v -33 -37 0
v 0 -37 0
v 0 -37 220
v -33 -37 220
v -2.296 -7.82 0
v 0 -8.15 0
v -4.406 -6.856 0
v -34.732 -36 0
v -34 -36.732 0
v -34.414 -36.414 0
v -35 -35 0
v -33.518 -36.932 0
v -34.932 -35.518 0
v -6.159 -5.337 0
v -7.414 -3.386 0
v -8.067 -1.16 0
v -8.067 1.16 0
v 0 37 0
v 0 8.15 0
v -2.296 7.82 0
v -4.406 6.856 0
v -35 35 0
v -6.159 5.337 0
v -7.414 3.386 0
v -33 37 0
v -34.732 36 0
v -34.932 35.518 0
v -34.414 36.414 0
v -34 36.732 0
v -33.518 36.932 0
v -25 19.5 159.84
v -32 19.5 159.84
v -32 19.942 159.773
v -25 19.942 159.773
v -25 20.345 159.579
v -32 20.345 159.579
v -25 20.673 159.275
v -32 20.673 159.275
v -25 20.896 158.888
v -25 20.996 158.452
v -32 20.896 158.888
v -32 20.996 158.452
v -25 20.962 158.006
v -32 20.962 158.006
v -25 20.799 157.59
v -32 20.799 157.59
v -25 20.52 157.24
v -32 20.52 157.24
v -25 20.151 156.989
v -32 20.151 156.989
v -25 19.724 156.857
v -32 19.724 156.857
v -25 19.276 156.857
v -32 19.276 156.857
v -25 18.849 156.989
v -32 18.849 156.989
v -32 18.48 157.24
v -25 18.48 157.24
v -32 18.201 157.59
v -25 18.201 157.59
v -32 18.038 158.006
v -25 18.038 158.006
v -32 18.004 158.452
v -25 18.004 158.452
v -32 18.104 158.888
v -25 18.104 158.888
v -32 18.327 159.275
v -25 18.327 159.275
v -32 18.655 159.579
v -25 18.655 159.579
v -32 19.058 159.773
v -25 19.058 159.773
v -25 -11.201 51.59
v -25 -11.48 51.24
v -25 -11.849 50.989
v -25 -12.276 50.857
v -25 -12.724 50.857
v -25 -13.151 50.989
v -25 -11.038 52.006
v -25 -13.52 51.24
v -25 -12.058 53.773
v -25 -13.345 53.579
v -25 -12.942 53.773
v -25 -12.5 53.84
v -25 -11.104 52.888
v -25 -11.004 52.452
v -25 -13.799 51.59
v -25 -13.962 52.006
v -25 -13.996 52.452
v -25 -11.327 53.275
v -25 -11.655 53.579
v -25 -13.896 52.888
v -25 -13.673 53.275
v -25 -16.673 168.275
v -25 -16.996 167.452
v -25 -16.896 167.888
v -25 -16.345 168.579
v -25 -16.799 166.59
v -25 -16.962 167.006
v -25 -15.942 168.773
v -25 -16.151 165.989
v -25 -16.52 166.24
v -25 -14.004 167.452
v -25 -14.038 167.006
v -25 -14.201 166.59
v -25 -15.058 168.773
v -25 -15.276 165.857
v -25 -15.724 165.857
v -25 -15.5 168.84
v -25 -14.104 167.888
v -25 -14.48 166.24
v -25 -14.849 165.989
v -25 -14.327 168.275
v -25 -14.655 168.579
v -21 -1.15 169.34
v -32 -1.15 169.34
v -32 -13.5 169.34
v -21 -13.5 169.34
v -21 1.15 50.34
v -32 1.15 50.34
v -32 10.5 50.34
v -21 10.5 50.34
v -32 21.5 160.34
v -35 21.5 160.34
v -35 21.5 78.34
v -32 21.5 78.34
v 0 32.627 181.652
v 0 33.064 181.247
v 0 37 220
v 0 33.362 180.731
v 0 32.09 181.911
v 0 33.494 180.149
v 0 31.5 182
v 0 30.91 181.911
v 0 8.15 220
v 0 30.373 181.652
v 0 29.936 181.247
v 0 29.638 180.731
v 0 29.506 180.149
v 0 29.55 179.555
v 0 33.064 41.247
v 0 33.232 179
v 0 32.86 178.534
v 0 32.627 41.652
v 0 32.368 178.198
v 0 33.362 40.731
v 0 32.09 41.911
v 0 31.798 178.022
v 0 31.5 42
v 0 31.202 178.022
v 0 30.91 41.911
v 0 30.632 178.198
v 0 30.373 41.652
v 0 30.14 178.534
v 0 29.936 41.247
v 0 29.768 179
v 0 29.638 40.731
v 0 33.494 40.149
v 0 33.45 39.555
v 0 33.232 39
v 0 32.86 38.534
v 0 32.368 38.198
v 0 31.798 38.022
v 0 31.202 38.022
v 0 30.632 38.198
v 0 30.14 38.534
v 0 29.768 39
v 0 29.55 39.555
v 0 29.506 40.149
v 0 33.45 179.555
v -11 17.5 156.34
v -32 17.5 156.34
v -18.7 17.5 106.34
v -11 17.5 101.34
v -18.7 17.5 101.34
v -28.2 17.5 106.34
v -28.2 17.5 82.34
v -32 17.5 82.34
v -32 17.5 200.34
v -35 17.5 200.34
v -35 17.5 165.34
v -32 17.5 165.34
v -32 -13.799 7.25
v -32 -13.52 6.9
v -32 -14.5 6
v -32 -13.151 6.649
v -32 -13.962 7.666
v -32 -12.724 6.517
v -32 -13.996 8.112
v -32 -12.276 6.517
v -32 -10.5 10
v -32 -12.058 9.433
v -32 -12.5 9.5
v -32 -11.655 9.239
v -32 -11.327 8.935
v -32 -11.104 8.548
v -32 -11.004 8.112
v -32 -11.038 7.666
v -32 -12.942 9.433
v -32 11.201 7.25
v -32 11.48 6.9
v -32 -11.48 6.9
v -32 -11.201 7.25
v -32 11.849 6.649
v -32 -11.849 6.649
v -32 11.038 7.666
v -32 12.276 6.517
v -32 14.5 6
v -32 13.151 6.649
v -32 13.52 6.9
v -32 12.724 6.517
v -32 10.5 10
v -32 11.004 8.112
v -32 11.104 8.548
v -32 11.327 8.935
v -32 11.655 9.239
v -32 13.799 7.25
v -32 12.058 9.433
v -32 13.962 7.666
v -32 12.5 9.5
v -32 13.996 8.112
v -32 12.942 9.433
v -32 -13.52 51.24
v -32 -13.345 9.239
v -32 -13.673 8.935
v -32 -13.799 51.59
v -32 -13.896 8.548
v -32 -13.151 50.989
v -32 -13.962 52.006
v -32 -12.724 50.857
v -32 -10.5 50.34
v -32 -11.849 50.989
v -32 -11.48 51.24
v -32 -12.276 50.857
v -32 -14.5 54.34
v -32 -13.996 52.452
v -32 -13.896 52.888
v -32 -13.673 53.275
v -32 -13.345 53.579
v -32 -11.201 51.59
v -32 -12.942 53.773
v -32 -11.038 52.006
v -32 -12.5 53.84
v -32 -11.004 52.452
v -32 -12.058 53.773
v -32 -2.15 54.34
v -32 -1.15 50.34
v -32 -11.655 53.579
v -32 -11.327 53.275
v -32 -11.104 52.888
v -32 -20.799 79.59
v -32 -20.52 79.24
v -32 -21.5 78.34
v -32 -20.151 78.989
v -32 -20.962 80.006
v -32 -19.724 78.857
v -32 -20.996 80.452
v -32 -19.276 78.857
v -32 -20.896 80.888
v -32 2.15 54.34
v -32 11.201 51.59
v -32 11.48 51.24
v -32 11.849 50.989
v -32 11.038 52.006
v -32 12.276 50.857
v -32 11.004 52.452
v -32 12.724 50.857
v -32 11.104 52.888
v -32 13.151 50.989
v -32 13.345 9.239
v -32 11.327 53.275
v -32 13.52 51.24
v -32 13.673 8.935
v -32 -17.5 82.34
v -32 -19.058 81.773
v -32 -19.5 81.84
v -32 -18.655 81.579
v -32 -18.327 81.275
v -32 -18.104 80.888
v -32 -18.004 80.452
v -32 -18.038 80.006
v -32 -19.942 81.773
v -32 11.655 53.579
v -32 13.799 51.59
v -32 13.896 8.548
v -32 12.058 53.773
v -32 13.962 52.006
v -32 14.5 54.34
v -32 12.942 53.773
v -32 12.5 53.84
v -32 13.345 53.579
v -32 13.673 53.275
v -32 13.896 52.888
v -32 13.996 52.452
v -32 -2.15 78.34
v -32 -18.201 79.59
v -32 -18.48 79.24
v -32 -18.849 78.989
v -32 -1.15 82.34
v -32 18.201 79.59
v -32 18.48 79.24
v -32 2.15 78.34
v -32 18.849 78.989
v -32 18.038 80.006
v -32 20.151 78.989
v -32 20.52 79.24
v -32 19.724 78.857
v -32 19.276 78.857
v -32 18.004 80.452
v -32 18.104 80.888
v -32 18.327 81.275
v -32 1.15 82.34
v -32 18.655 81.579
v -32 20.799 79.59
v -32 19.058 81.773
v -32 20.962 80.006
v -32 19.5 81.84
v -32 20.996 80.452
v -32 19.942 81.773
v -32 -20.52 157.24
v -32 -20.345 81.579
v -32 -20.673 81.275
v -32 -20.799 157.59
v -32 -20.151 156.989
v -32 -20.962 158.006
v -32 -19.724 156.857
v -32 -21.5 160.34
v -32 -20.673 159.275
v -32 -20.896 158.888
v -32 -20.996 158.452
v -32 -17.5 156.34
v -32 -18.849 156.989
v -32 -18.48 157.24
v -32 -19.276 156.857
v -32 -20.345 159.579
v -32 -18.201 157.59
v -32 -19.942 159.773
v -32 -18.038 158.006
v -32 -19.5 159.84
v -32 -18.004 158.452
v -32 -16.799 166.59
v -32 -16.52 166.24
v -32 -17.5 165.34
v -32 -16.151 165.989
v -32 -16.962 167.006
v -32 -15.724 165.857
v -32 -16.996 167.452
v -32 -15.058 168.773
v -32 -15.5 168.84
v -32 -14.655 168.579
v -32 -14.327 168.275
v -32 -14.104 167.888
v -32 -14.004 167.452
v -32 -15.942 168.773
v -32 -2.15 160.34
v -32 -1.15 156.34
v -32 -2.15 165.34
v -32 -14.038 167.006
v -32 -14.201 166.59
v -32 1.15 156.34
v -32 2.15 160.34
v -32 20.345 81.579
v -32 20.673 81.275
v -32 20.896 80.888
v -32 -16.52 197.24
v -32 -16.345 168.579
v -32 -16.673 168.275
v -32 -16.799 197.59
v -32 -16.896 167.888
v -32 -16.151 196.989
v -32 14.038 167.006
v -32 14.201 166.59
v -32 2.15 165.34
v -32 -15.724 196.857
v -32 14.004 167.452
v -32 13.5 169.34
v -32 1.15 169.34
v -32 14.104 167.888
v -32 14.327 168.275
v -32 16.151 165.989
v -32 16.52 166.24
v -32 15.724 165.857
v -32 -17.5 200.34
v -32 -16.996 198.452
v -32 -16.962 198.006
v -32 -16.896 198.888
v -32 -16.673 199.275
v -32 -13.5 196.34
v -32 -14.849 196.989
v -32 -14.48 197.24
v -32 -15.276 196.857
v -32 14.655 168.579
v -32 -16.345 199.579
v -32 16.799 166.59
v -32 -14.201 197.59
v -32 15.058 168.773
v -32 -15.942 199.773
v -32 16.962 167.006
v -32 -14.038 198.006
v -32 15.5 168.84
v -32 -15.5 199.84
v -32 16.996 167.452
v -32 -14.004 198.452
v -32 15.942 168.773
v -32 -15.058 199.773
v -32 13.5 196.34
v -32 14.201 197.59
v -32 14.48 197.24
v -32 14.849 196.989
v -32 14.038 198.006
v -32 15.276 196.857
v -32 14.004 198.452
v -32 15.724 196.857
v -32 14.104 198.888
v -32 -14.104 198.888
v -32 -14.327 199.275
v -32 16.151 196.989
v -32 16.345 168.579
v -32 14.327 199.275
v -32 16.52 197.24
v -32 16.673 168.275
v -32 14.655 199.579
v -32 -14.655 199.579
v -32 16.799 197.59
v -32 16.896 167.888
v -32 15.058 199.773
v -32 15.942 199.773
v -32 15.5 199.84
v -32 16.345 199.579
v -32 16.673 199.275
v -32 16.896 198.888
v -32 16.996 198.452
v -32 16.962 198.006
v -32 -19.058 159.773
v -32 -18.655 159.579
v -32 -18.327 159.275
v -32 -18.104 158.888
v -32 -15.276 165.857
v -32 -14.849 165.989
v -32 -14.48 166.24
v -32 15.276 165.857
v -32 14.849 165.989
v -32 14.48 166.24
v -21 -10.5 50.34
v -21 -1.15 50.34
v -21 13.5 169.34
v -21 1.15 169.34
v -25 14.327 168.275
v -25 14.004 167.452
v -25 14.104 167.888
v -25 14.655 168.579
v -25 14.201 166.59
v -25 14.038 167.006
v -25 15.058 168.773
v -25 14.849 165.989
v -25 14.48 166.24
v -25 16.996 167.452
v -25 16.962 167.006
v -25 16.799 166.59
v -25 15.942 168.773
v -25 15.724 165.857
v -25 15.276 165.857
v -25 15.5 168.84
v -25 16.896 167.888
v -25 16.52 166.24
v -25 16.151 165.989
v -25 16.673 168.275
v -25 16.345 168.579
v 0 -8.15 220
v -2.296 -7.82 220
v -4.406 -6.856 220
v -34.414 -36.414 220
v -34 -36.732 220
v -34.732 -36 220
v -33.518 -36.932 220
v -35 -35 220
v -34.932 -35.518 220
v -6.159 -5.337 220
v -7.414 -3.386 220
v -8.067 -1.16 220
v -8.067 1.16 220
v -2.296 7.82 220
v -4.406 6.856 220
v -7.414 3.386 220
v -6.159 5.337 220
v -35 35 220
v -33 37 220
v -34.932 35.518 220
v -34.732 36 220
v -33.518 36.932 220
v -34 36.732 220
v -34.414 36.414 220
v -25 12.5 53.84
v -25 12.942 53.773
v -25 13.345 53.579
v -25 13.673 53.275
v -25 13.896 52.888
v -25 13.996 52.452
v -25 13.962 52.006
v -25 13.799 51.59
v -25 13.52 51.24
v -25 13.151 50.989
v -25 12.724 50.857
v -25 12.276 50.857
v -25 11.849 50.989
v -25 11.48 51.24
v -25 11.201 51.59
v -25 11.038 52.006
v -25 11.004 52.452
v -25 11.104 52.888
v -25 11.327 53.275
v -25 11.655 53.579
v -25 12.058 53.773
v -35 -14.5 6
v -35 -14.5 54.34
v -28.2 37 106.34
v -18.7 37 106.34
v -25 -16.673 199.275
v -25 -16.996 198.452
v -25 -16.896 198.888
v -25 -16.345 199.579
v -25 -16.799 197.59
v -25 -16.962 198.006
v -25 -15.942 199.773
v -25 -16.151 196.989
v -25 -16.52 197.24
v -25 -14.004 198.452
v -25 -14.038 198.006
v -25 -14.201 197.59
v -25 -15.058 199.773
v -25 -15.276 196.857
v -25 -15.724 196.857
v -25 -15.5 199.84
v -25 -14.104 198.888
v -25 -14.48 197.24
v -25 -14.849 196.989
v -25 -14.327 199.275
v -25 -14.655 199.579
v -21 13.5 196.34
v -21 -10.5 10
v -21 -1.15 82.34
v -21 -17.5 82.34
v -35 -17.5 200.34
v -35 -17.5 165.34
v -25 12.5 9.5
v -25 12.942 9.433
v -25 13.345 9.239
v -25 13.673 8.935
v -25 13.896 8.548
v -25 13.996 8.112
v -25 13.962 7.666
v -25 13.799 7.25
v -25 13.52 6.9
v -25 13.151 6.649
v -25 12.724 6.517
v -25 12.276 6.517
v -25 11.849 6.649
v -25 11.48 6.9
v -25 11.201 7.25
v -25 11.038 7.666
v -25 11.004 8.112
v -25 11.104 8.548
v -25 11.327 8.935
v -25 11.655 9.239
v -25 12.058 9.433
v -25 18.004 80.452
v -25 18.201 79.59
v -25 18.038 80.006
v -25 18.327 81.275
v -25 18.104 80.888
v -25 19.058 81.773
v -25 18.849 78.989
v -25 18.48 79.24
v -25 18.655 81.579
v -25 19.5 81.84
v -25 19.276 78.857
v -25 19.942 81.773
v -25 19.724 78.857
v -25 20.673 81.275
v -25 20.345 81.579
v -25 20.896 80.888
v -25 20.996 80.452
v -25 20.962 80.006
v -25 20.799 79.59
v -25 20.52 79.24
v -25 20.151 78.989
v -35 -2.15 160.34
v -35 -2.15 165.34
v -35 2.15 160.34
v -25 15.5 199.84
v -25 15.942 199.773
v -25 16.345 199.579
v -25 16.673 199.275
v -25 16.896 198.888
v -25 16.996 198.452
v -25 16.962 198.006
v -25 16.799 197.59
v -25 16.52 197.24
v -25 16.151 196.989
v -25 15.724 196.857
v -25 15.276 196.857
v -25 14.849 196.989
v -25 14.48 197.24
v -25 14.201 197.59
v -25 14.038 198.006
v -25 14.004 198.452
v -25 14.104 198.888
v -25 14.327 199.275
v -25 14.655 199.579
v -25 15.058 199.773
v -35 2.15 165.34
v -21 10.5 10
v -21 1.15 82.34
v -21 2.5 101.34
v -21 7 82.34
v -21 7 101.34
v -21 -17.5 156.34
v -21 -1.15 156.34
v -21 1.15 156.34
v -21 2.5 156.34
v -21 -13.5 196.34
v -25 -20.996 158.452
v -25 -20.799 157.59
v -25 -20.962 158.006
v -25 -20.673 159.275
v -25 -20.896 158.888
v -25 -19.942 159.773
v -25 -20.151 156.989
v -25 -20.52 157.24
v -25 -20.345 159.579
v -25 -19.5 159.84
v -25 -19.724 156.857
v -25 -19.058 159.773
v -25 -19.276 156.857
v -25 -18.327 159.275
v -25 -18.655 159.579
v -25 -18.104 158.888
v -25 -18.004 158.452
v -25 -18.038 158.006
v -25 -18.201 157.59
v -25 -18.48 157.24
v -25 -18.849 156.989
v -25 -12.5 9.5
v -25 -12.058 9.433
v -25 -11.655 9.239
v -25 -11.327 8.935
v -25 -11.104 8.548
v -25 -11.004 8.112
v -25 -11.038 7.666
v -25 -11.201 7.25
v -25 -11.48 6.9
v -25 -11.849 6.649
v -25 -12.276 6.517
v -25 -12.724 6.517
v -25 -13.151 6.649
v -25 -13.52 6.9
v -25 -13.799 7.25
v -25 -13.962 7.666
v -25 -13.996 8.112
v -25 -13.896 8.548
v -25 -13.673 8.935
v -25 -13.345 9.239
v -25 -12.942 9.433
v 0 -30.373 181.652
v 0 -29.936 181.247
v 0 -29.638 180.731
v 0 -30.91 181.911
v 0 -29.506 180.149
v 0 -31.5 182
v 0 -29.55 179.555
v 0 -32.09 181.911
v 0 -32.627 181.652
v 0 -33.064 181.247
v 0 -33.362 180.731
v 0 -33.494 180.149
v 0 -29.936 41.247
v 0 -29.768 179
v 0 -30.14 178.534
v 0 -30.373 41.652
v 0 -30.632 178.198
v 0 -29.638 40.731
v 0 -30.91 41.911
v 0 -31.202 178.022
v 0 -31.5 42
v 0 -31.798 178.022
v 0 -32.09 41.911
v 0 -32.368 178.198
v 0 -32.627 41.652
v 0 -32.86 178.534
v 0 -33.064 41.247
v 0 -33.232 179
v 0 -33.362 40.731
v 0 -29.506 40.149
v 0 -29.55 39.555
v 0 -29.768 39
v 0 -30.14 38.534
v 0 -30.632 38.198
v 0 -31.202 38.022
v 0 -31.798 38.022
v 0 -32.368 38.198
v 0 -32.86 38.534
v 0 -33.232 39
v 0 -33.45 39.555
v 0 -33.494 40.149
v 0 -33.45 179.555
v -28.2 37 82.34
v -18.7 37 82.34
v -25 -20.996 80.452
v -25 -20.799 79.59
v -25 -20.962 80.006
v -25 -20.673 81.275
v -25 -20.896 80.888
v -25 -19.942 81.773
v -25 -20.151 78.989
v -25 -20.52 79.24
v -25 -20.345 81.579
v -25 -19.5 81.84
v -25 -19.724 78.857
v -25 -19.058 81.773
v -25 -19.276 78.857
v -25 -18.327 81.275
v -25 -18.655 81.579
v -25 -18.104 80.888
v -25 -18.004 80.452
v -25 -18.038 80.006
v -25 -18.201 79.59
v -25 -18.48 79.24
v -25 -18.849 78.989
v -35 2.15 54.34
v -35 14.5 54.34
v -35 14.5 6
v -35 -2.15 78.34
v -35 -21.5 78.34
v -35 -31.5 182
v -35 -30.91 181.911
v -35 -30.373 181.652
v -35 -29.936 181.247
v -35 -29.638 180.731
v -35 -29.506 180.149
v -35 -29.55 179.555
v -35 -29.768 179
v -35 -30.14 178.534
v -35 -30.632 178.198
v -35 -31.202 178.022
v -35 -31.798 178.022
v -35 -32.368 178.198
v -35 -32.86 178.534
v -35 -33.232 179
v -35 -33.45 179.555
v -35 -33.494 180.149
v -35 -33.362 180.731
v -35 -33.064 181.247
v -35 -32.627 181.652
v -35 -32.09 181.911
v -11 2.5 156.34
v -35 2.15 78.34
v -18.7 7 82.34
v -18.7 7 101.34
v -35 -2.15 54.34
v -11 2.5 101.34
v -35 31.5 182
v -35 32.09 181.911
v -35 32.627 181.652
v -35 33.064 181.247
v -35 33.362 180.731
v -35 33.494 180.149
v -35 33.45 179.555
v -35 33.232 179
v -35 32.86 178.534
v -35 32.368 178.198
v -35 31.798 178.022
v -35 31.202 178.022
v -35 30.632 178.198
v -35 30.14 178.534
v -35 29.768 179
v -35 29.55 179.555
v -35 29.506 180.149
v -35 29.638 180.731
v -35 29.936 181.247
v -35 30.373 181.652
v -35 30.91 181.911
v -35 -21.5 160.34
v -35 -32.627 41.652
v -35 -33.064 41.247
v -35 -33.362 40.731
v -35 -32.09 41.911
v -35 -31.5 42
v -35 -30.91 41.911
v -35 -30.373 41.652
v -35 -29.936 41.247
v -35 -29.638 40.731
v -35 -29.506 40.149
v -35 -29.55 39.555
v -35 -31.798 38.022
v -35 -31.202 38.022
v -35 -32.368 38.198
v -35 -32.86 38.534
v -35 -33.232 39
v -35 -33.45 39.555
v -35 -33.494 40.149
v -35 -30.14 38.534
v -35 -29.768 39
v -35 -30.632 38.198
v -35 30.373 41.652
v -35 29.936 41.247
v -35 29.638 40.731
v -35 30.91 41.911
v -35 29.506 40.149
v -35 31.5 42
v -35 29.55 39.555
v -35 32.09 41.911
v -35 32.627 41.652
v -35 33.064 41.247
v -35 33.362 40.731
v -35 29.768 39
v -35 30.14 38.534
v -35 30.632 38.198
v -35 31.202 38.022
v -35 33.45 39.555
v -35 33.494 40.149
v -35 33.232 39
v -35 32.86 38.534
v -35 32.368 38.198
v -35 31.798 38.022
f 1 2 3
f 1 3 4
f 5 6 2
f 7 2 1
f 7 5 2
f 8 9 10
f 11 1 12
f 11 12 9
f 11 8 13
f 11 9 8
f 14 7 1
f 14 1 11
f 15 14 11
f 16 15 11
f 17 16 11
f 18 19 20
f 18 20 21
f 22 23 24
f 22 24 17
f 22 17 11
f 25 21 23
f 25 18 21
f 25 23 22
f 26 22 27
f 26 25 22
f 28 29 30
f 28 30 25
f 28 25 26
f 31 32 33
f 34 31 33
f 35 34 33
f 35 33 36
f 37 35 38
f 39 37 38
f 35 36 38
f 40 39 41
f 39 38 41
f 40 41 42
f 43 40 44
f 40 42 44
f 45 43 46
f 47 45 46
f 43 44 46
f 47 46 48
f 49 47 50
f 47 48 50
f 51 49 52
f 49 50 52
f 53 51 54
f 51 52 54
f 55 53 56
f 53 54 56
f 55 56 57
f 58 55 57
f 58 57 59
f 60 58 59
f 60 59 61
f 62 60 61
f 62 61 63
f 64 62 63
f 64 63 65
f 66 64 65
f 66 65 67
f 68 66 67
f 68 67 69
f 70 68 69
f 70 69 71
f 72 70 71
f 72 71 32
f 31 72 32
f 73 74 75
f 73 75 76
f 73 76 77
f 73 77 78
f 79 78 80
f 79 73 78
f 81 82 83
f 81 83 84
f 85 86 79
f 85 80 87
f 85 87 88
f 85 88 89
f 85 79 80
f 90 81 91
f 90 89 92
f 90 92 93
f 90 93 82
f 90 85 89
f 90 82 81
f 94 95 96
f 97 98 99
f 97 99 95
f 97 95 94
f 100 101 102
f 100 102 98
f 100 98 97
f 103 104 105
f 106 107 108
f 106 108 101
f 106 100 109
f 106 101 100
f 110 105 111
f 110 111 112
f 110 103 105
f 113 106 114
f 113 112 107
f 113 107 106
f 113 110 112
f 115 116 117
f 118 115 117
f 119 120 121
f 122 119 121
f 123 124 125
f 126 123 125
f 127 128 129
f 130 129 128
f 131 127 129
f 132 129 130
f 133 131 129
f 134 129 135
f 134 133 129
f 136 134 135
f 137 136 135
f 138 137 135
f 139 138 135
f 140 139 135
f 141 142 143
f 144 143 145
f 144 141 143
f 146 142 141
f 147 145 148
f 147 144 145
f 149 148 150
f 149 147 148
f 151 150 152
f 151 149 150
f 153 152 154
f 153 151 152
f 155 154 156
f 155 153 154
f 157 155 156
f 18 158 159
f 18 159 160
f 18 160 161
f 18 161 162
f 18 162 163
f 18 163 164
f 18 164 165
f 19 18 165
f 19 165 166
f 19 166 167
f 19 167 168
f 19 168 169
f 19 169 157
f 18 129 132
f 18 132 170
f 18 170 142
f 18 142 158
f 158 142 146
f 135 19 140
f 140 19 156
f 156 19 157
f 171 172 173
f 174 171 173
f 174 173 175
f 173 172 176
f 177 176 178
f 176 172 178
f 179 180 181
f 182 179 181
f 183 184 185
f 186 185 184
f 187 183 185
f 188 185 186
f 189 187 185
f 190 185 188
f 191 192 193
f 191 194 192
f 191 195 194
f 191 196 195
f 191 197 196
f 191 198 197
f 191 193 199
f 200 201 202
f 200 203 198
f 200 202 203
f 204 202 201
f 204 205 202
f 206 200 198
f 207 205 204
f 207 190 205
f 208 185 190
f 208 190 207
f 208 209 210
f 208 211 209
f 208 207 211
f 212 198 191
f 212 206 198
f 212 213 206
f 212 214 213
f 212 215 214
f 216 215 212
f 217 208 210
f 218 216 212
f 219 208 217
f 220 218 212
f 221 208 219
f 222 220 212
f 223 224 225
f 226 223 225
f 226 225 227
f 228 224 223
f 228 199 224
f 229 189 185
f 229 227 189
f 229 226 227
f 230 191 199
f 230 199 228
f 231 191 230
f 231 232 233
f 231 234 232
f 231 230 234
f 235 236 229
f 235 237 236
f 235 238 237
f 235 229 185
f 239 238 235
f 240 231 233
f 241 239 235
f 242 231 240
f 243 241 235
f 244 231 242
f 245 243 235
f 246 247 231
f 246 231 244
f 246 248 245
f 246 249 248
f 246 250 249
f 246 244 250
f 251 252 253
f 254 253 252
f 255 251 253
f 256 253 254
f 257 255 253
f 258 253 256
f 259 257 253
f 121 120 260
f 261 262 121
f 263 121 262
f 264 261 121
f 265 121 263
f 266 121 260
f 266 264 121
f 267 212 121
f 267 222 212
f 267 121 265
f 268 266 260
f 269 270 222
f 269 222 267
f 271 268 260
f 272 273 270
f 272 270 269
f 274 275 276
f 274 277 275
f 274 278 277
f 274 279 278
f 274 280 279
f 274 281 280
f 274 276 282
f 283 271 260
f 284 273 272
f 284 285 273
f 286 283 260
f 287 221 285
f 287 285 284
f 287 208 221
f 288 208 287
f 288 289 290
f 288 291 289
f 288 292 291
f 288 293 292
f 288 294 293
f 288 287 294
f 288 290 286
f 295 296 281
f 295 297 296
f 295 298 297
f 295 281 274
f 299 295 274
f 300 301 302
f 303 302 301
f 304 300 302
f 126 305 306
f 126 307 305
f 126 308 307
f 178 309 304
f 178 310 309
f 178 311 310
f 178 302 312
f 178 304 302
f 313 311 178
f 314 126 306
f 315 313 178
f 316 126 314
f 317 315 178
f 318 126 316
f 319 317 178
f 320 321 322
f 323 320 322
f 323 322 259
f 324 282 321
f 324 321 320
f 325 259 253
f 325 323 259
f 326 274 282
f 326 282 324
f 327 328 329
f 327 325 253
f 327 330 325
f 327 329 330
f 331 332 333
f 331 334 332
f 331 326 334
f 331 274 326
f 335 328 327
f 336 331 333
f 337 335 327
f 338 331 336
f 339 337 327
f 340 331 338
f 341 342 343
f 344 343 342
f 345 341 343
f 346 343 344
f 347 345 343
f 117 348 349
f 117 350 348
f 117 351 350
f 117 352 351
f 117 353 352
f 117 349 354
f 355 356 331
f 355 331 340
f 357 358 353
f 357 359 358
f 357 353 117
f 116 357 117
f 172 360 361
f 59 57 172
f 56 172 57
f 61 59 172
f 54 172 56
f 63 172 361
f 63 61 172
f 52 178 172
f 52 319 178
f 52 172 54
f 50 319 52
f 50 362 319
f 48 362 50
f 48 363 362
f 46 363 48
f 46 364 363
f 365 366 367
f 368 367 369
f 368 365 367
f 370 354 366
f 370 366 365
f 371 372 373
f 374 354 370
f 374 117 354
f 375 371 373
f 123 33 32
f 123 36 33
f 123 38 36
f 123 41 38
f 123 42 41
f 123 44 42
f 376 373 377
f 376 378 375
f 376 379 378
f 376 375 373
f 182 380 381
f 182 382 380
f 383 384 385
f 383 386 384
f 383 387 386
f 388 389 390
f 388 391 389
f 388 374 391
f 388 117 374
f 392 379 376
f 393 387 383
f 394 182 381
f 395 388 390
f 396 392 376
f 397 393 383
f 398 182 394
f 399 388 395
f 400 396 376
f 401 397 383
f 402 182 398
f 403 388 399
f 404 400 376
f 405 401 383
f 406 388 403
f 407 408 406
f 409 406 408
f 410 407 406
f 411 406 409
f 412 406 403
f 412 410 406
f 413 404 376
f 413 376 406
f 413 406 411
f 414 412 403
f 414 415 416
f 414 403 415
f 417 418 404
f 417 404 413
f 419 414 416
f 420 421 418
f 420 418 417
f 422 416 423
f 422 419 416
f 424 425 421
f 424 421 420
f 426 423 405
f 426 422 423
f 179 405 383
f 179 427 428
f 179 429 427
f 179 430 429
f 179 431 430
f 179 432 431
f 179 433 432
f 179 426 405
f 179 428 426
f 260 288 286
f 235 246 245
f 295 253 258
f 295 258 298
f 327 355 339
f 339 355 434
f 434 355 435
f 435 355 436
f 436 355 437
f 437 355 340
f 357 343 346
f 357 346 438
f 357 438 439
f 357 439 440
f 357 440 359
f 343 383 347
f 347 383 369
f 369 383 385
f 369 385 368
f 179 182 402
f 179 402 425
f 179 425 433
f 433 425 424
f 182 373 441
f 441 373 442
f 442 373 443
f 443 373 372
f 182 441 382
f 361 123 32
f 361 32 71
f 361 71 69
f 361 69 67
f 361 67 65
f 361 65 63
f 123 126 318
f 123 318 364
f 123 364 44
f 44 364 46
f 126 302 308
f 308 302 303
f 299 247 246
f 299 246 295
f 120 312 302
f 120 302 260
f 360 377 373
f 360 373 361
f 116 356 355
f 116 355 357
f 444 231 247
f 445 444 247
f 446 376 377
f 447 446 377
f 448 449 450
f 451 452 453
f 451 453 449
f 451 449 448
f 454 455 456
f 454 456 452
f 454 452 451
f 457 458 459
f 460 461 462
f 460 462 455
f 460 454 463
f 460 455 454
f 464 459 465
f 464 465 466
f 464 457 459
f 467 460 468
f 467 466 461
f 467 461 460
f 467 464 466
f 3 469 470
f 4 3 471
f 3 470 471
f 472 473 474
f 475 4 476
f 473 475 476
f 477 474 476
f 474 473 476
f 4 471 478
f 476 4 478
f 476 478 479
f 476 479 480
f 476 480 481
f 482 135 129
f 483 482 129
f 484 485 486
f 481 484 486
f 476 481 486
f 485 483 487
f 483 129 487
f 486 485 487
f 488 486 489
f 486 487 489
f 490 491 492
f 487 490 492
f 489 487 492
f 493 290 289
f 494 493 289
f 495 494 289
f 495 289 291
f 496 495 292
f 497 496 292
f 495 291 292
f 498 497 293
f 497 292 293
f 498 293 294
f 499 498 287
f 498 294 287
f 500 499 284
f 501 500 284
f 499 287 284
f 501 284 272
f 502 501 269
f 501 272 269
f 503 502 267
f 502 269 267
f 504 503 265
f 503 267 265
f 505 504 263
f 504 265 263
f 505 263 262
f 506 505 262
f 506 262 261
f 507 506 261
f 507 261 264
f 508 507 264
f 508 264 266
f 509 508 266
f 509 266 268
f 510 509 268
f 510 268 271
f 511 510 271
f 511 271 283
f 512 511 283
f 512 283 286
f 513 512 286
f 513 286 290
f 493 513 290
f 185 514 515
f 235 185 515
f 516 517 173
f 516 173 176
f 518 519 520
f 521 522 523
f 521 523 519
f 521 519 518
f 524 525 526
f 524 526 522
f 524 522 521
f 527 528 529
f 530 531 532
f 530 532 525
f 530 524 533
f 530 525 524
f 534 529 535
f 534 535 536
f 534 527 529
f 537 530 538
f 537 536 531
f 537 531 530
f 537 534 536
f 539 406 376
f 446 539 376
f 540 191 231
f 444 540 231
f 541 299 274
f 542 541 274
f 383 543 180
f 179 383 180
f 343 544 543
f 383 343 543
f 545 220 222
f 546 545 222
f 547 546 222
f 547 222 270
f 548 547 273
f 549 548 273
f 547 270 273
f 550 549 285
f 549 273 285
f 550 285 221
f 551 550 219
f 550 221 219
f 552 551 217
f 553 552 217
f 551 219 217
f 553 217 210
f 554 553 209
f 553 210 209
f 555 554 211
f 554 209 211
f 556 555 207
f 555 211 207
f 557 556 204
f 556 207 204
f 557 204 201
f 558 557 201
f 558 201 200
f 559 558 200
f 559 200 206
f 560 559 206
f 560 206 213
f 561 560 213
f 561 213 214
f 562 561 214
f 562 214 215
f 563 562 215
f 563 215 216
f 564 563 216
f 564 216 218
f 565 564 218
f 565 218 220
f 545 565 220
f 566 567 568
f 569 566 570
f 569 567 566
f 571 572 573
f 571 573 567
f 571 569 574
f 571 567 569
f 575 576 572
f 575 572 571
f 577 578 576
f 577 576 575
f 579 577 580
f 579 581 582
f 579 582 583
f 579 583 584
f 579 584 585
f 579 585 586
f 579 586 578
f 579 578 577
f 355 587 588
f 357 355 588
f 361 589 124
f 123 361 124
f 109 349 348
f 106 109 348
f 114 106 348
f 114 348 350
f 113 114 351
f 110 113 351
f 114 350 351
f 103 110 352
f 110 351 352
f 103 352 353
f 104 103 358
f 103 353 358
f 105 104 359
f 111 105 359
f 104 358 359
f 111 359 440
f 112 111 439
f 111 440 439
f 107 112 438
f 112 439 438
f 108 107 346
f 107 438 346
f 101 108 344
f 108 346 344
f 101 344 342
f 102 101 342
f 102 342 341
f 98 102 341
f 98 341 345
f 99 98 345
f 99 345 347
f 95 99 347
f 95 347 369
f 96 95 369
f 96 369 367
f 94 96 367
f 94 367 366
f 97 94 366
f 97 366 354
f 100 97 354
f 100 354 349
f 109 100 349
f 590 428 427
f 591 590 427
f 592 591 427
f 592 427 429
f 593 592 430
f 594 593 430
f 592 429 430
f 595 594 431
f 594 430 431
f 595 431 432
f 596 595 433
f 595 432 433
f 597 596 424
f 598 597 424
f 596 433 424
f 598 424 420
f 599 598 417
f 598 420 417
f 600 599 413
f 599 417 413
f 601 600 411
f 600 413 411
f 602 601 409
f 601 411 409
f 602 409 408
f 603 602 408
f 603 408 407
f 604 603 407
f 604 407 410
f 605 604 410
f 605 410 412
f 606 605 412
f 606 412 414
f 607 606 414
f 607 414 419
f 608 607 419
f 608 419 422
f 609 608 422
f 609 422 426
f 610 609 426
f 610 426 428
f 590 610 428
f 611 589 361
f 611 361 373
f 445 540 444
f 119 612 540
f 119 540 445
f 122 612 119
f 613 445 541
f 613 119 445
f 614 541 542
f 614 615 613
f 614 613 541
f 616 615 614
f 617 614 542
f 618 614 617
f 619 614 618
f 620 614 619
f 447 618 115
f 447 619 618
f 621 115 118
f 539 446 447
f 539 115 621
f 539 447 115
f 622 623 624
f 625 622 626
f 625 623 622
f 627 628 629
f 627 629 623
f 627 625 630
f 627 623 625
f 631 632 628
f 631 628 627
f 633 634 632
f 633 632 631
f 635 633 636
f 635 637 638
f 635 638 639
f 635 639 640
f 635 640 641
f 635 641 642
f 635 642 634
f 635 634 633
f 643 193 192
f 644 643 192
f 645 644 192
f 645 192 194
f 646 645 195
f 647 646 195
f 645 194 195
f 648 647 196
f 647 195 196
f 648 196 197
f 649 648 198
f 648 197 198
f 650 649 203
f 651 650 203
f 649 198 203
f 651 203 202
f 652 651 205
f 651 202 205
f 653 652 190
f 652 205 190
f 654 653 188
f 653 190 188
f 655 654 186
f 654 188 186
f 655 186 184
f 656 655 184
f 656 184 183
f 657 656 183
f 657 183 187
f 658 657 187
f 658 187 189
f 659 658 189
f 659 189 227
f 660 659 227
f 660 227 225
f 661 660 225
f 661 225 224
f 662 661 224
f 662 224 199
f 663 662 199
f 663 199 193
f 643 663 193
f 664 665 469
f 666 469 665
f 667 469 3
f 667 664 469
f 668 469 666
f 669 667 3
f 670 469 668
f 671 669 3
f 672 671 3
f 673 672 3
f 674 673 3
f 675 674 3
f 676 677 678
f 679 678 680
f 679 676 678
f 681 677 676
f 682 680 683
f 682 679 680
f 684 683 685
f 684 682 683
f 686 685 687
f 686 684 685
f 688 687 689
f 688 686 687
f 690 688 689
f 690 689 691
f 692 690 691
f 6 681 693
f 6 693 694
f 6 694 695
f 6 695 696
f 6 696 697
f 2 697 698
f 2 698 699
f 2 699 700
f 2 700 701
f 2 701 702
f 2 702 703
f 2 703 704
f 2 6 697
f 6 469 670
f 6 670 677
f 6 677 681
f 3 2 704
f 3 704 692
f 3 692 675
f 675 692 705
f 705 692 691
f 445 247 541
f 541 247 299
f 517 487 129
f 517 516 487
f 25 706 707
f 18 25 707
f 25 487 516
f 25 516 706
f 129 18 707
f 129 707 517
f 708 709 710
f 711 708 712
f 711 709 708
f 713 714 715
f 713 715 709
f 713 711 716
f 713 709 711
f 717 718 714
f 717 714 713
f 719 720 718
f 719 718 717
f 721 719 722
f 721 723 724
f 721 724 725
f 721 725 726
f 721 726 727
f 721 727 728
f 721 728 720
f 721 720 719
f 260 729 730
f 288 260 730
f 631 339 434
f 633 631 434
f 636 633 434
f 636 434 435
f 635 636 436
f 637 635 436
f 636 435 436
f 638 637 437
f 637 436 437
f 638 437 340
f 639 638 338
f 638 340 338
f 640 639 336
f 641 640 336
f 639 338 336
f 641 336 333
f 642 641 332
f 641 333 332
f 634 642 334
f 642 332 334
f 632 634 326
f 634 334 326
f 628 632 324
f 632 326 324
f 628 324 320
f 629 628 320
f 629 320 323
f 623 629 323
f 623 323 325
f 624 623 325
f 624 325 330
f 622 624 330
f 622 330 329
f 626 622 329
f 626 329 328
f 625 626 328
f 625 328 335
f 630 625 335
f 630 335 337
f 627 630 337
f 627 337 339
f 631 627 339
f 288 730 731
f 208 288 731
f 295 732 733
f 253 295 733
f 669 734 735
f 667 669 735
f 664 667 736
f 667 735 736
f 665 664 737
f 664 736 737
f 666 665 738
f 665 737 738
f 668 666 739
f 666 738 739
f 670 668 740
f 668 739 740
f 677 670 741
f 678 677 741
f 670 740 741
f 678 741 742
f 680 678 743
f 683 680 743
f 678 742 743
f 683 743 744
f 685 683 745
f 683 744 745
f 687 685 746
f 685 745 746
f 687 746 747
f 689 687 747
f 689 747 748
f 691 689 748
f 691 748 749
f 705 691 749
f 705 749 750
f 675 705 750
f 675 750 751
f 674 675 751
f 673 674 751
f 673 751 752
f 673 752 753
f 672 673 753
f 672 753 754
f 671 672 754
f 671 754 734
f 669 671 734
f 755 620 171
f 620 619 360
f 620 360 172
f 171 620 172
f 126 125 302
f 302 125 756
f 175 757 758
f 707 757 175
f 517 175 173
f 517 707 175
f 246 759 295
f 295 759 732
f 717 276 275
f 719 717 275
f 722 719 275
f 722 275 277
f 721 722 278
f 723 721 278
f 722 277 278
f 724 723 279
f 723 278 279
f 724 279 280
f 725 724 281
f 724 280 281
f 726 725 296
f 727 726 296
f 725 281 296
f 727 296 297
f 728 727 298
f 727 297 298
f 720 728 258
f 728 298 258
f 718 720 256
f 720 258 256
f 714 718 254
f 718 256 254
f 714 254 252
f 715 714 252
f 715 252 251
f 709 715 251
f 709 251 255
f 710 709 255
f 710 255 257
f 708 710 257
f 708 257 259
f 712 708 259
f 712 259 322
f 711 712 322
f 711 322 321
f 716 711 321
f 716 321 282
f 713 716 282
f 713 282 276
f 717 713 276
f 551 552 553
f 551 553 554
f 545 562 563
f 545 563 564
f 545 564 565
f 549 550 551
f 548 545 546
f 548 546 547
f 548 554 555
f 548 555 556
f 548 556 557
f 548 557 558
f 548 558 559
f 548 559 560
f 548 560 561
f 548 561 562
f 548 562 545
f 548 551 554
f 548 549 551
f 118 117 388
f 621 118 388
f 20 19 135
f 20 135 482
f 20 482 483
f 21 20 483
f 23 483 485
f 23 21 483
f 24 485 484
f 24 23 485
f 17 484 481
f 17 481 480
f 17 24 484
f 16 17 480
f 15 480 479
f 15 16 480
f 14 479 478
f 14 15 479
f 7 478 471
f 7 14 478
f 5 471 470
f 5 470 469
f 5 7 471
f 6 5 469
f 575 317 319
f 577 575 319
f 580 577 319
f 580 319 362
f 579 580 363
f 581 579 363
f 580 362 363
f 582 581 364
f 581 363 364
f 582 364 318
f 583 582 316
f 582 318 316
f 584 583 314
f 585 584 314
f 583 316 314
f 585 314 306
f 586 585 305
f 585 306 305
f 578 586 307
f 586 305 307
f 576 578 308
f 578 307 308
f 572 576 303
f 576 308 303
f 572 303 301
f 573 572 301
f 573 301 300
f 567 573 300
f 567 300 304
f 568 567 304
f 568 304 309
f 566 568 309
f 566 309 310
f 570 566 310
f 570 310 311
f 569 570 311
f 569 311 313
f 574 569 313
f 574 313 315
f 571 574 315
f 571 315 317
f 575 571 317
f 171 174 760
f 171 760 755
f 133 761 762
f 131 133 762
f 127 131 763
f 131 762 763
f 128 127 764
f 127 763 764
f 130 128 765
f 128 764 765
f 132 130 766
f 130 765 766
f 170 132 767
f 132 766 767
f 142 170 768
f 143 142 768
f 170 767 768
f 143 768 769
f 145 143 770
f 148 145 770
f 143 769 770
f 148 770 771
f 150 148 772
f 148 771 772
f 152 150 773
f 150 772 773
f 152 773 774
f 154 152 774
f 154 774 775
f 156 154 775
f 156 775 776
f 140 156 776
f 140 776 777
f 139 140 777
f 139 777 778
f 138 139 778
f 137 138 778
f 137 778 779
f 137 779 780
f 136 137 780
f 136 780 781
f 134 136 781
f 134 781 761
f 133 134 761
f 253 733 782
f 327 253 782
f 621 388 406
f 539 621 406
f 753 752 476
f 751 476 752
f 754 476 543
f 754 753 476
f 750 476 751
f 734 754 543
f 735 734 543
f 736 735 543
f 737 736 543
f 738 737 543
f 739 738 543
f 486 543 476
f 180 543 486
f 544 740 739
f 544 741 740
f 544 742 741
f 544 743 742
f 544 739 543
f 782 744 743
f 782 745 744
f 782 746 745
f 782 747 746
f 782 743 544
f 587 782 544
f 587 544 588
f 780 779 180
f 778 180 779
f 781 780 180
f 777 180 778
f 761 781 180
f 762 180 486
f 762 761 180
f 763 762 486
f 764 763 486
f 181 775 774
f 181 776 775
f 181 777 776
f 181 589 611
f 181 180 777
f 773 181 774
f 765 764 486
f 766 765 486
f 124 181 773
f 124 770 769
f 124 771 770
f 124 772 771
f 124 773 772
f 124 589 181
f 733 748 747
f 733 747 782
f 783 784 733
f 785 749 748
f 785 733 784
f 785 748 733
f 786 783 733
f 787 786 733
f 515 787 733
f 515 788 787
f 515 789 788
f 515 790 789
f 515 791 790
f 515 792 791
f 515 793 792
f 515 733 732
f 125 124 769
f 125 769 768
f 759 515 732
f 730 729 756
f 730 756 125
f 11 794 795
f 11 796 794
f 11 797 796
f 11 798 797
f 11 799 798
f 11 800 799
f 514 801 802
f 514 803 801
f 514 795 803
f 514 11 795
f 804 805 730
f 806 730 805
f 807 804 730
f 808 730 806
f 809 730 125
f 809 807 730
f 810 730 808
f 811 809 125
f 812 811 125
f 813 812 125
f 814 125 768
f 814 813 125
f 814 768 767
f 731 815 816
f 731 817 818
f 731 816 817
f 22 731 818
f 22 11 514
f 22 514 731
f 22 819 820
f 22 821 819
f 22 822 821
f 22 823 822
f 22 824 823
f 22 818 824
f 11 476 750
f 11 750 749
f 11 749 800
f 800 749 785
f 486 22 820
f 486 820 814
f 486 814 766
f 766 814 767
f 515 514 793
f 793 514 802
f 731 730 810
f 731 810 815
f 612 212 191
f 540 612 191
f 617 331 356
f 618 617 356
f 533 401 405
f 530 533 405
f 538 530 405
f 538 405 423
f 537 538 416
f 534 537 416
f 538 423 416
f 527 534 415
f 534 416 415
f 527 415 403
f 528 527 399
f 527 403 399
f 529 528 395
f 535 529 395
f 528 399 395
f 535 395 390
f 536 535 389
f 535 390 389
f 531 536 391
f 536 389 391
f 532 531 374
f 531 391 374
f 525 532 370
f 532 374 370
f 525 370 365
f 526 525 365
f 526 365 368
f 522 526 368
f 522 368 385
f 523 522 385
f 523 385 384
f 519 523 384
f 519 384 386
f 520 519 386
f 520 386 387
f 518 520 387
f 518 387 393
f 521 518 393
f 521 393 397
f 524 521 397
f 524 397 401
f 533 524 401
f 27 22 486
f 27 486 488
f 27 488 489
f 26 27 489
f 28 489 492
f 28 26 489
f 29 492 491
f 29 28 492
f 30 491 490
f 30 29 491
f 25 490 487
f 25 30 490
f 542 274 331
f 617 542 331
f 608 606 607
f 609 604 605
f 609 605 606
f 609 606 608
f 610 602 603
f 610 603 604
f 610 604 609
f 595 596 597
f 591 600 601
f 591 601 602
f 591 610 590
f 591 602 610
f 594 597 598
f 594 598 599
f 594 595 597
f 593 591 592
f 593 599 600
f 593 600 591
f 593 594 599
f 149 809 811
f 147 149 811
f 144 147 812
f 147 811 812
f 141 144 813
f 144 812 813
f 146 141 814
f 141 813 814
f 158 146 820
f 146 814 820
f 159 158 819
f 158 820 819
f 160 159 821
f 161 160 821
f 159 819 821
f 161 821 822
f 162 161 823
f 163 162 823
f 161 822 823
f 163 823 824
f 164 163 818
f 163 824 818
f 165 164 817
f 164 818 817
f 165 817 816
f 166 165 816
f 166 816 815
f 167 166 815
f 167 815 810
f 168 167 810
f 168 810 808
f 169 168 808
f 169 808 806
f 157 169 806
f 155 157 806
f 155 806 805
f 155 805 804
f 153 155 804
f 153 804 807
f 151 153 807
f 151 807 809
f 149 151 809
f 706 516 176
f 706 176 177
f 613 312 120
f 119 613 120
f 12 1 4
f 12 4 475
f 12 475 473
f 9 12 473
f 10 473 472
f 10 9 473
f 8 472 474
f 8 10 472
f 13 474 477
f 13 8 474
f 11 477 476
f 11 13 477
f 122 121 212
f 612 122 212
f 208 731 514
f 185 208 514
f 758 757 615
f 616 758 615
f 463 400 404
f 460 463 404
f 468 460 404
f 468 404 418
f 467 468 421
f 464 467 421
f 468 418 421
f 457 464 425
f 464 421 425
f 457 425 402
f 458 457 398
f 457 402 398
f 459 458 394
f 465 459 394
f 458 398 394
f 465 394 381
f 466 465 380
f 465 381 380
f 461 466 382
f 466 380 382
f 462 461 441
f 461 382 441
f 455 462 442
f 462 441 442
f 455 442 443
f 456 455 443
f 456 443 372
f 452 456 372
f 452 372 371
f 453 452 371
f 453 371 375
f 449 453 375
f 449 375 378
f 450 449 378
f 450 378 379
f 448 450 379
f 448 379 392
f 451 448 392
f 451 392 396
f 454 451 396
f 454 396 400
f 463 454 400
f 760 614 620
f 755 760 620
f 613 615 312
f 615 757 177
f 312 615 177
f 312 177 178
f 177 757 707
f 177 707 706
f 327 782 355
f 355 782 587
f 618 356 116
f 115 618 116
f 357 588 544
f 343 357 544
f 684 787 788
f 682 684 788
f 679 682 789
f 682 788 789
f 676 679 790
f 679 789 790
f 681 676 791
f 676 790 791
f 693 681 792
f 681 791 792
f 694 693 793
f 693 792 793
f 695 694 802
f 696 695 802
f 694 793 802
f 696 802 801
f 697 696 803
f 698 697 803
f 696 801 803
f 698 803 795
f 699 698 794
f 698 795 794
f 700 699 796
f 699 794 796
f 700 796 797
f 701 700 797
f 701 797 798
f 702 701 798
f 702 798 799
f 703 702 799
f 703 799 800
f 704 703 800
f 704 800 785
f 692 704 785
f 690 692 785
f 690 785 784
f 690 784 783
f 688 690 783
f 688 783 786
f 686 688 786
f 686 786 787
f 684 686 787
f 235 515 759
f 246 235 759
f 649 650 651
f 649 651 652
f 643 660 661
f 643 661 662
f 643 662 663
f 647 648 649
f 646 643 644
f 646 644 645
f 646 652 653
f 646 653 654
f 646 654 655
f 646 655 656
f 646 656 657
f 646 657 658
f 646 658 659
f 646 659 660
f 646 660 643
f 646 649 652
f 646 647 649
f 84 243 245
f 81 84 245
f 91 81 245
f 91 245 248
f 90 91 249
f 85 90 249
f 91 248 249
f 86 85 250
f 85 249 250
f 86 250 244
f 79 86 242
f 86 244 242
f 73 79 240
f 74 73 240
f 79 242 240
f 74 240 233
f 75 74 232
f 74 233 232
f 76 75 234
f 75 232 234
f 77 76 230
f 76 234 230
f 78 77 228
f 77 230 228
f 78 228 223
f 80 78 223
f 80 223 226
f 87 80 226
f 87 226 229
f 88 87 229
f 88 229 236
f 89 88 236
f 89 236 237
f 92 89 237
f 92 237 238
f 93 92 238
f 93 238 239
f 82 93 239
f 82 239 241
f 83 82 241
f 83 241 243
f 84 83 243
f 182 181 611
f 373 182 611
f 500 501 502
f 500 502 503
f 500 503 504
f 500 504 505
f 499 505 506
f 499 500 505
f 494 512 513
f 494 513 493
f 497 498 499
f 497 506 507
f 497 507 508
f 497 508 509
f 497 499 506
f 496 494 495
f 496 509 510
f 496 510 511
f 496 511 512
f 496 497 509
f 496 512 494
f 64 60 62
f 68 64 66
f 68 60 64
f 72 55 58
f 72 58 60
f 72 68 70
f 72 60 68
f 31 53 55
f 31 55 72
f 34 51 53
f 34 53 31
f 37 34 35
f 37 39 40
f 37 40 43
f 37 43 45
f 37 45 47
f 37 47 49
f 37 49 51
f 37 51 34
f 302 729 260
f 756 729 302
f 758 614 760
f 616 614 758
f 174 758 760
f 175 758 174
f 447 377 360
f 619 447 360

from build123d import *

# Parameters (mm, degrees)
SALIENTE_EXTRUIR1_DEPTH = 220
CORTAR_EXTRUIR2_DEPTH   = 14
CROQUIS2_9_W            = 24
CROQUIS2_9_H            = 1
CROQUIS2_9_W_2          = 5
CORTAR_EXTRUIR3_DEPTH   = 3
CROQUIS4_R              = 1.5
CORTAR_EXTRUIR4_DEPTH   = 10
CROQUIS5_R              = 2
CORTAR_EXTRUIR5_DEPTH   = 36
CROQUIS6_W              = 55
CROQUIS6_H              = 15
CORTAR_EXTRUIR7_DEPTH   = 10
CORTAR_EXTRUIR8_DEPTH   = 30


with BuildPart() as part:
    # Croquis1 → Saliente-Extruir1 (new body)
    with BuildSketch(Plane.XY):
        with BuildLine():
            Line((0, 37), (0, 8.15))
            ThreePointArc((0, 8.15), (-8.15, 0), (0, -8.15))
            Line((0, -8.15), (0, -37))
            Line((0, -37), (-33, -37))
            ThreePointArc((-33, -37), (-34.414213562, -36.414213562), (-35, -35))
            Line((-35, -35), (-35, 35))
            ThreePointArc((-35, 35), (-34.414213562, 36.414213562), (-33, 37))
            Line((-33, 37), (0, 37))
        make_face()
    extrude(amount=SALIENTE_EXTRUIR1_DEPTH)

    # Croquis2 → Cortar-Extruir2 (cut)
    with BuildSketch(Plane.ZY.offset(35)):
        Polygon((50.34, -1.15), (82.34, -1.15), (82.34, -17.5), (156.34, -17.5), (156.34, -1.15), (169.34, -1.15), (169.34, -13.5), (196.34, -13.5), (196.34, 13.5), (169.34, 13.5), (169.34, 1.15), (156.34, 1.15), (156.34, 17.5), (82.34, 17.5), (82.34, 1.15), (50.34, 1.15), (50.34, 10.5), (10, 10.5), (10, -10.5), (50.34, -10.5), align=None)
    extrude(amount=-CORTAR_EXTRUIR2_DEPTH, mode=Mode.SUBTRACT)

    # Croquis2_9 → Cortar-Extruir3 (cut)
    with BuildSketch(Plane.ZY.offset(35)):
        Polygon((54.34, 1.15), (54.34, 2.15), (54.34, 14.5), (6, 14.5), (6, -14.5), (54.34, -14.5), (54.34, -2.15), (54.34, -1.15), (50.34, -1.15), (50.34, -10.5), (10, -10.5), (10, 10.5), (50.34, 10.5), (50.34, 1.15), align=None)
        with Locations((66.34, 1.65)):
            Rectangle(CROQUIS2_9_W, CROQUIS2_9_H)
        with Locations((66.34, -1.65)):
            Rectangle(CROQUIS2_9_W, CROQUIS2_9_H)
        Polygon((78.34, 21.5), (78.34, 2.15), (78.34, 1.15), (82.34, 1.15), (82.34, 17.5), (156.34, 17.5), (156.34, 1.15), (160.34, 1.15), (160.34, 2.15), (160.34, 21.5), align=None)
        Polygon((82.34, -1.15), (78.34, -1.15), (78.34, -2.15), (78.34, -21.5), (160.34, -21.5), (160.34, -2.15), (160.34, -1.15), (156.34, -1.15), (156.34, -17.5), (82.34, -17.5), align=None)
        with Locations((162.84, 1.65)):
            Rectangle(CROQUIS2_9_W_2, CROQUIS2_9_H)
        with Locations((162.84, -1.65)):
            Rectangle(CROQUIS2_9_W_2, CROQUIS2_9_H)
        Polygon((165.34, 17.5), (165.34, 2.15), (165.34, 1.15), (169.34, 1.15), (169.34, 13.5), (196.34, 13.5), (196.34, -13.5), (169.34, -13.5), (169.34, -1.15), (165.34, -1.15), (165.34, -2.15), (165.34, -17.5), (200.34, -17.5), (200.34, 17.5), align=None)
    extrude(amount=-CORTAR_EXTRUIR3_DEPTH, mode=Mode.SUBTRACT)

    # Croquis4 → Cortar-Extruir4 (cut)
    with BuildSketch(Plane.ZY.offset(35)):
        with Locations((8, 12.5)):
            Circle(CROQUIS4_R)
        with Locations((8, -12.5)):
            Circle(CROQUIS4_R)
        with Locations((52.34, 12.5)):
            Circle(CROQUIS4_R)
        with Locations((52.34, -12.5)):
            Circle(CROQUIS4_R)
        with Locations((80.34, 19.5)):
            Circle(CROQUIS4_R)
        with Locations((158.34, 19.5)):
            Circle(CROQUIS4_R)
        with Locations((80.34, -19.5)):
            Circle(CROQUIS4_R)
        with Locations((158.34, -19.5)):
            Circle(CROQUIS4_R)
        with Locations((167.34, 15.5)):
            Circle(CROQUIS4_R)
        with Locations((198.34, 15.5)):
            Circle(CROQUIS4_R)
        with Locations((167.34, -15.5)):
            Circle(CROQUIS4_R)
        with Locations((198.34, -15.5)):
            Circle(CROQUIS4_R)
    extrude(amount=-CORTAR_EXTRUIR4_DEPTH, mode=Mode.SUBTRACT)

    # Croquis5 → Cortar-Extruir5 (cut, through all)
    with BuildSketch(Plane.ZY.offset(35)):
        with Locations((40, 31.5)):
            Circle(CROQUIS5_R)
        with Locations((40, -31.5)):
            Circle(CROQUIS5_R)
        with Locations((180, 31.5)):
            Circle(CROQUIS5_R)
        with Locations((180, -31.5)):
            Circle(CROQUIS5_R)
    extrude(amount=-CORTAR_EXTRUIR5_DEPTH, mode=Mode.SUBTRACT)

    # Croquis6 → Cortar-Extruir7 (cut)
    with BuildSketch(Plane.ZY.offset(21)):
        with Locations((128.84, 10)):
            Rectangle(CROQUIS6_W, CROQUIS6_H)
    extrude(amount=-CORTAR_EXTRUIR7_DEPTH, mode=Mode.SUBTRACT)

    # Croquis12 → Cortar-Extruir8 (cut)
    with BuildSketch(Plane(origin=(0, 37, 0), x_dir=(1, 0, 0), z_dir=(0, 1, 0))):
        Polygon((-19.700712137, -82.34), (-18.7, -82.34), (-18.7, -106.34), (-28.2, -106.34), (-28.2, -82.34), align=None)
    extrude(amount=-CORTAR_EXTRUIR8_DEPTH, mode=Mode.SUBTRACT)


solid = part.part
